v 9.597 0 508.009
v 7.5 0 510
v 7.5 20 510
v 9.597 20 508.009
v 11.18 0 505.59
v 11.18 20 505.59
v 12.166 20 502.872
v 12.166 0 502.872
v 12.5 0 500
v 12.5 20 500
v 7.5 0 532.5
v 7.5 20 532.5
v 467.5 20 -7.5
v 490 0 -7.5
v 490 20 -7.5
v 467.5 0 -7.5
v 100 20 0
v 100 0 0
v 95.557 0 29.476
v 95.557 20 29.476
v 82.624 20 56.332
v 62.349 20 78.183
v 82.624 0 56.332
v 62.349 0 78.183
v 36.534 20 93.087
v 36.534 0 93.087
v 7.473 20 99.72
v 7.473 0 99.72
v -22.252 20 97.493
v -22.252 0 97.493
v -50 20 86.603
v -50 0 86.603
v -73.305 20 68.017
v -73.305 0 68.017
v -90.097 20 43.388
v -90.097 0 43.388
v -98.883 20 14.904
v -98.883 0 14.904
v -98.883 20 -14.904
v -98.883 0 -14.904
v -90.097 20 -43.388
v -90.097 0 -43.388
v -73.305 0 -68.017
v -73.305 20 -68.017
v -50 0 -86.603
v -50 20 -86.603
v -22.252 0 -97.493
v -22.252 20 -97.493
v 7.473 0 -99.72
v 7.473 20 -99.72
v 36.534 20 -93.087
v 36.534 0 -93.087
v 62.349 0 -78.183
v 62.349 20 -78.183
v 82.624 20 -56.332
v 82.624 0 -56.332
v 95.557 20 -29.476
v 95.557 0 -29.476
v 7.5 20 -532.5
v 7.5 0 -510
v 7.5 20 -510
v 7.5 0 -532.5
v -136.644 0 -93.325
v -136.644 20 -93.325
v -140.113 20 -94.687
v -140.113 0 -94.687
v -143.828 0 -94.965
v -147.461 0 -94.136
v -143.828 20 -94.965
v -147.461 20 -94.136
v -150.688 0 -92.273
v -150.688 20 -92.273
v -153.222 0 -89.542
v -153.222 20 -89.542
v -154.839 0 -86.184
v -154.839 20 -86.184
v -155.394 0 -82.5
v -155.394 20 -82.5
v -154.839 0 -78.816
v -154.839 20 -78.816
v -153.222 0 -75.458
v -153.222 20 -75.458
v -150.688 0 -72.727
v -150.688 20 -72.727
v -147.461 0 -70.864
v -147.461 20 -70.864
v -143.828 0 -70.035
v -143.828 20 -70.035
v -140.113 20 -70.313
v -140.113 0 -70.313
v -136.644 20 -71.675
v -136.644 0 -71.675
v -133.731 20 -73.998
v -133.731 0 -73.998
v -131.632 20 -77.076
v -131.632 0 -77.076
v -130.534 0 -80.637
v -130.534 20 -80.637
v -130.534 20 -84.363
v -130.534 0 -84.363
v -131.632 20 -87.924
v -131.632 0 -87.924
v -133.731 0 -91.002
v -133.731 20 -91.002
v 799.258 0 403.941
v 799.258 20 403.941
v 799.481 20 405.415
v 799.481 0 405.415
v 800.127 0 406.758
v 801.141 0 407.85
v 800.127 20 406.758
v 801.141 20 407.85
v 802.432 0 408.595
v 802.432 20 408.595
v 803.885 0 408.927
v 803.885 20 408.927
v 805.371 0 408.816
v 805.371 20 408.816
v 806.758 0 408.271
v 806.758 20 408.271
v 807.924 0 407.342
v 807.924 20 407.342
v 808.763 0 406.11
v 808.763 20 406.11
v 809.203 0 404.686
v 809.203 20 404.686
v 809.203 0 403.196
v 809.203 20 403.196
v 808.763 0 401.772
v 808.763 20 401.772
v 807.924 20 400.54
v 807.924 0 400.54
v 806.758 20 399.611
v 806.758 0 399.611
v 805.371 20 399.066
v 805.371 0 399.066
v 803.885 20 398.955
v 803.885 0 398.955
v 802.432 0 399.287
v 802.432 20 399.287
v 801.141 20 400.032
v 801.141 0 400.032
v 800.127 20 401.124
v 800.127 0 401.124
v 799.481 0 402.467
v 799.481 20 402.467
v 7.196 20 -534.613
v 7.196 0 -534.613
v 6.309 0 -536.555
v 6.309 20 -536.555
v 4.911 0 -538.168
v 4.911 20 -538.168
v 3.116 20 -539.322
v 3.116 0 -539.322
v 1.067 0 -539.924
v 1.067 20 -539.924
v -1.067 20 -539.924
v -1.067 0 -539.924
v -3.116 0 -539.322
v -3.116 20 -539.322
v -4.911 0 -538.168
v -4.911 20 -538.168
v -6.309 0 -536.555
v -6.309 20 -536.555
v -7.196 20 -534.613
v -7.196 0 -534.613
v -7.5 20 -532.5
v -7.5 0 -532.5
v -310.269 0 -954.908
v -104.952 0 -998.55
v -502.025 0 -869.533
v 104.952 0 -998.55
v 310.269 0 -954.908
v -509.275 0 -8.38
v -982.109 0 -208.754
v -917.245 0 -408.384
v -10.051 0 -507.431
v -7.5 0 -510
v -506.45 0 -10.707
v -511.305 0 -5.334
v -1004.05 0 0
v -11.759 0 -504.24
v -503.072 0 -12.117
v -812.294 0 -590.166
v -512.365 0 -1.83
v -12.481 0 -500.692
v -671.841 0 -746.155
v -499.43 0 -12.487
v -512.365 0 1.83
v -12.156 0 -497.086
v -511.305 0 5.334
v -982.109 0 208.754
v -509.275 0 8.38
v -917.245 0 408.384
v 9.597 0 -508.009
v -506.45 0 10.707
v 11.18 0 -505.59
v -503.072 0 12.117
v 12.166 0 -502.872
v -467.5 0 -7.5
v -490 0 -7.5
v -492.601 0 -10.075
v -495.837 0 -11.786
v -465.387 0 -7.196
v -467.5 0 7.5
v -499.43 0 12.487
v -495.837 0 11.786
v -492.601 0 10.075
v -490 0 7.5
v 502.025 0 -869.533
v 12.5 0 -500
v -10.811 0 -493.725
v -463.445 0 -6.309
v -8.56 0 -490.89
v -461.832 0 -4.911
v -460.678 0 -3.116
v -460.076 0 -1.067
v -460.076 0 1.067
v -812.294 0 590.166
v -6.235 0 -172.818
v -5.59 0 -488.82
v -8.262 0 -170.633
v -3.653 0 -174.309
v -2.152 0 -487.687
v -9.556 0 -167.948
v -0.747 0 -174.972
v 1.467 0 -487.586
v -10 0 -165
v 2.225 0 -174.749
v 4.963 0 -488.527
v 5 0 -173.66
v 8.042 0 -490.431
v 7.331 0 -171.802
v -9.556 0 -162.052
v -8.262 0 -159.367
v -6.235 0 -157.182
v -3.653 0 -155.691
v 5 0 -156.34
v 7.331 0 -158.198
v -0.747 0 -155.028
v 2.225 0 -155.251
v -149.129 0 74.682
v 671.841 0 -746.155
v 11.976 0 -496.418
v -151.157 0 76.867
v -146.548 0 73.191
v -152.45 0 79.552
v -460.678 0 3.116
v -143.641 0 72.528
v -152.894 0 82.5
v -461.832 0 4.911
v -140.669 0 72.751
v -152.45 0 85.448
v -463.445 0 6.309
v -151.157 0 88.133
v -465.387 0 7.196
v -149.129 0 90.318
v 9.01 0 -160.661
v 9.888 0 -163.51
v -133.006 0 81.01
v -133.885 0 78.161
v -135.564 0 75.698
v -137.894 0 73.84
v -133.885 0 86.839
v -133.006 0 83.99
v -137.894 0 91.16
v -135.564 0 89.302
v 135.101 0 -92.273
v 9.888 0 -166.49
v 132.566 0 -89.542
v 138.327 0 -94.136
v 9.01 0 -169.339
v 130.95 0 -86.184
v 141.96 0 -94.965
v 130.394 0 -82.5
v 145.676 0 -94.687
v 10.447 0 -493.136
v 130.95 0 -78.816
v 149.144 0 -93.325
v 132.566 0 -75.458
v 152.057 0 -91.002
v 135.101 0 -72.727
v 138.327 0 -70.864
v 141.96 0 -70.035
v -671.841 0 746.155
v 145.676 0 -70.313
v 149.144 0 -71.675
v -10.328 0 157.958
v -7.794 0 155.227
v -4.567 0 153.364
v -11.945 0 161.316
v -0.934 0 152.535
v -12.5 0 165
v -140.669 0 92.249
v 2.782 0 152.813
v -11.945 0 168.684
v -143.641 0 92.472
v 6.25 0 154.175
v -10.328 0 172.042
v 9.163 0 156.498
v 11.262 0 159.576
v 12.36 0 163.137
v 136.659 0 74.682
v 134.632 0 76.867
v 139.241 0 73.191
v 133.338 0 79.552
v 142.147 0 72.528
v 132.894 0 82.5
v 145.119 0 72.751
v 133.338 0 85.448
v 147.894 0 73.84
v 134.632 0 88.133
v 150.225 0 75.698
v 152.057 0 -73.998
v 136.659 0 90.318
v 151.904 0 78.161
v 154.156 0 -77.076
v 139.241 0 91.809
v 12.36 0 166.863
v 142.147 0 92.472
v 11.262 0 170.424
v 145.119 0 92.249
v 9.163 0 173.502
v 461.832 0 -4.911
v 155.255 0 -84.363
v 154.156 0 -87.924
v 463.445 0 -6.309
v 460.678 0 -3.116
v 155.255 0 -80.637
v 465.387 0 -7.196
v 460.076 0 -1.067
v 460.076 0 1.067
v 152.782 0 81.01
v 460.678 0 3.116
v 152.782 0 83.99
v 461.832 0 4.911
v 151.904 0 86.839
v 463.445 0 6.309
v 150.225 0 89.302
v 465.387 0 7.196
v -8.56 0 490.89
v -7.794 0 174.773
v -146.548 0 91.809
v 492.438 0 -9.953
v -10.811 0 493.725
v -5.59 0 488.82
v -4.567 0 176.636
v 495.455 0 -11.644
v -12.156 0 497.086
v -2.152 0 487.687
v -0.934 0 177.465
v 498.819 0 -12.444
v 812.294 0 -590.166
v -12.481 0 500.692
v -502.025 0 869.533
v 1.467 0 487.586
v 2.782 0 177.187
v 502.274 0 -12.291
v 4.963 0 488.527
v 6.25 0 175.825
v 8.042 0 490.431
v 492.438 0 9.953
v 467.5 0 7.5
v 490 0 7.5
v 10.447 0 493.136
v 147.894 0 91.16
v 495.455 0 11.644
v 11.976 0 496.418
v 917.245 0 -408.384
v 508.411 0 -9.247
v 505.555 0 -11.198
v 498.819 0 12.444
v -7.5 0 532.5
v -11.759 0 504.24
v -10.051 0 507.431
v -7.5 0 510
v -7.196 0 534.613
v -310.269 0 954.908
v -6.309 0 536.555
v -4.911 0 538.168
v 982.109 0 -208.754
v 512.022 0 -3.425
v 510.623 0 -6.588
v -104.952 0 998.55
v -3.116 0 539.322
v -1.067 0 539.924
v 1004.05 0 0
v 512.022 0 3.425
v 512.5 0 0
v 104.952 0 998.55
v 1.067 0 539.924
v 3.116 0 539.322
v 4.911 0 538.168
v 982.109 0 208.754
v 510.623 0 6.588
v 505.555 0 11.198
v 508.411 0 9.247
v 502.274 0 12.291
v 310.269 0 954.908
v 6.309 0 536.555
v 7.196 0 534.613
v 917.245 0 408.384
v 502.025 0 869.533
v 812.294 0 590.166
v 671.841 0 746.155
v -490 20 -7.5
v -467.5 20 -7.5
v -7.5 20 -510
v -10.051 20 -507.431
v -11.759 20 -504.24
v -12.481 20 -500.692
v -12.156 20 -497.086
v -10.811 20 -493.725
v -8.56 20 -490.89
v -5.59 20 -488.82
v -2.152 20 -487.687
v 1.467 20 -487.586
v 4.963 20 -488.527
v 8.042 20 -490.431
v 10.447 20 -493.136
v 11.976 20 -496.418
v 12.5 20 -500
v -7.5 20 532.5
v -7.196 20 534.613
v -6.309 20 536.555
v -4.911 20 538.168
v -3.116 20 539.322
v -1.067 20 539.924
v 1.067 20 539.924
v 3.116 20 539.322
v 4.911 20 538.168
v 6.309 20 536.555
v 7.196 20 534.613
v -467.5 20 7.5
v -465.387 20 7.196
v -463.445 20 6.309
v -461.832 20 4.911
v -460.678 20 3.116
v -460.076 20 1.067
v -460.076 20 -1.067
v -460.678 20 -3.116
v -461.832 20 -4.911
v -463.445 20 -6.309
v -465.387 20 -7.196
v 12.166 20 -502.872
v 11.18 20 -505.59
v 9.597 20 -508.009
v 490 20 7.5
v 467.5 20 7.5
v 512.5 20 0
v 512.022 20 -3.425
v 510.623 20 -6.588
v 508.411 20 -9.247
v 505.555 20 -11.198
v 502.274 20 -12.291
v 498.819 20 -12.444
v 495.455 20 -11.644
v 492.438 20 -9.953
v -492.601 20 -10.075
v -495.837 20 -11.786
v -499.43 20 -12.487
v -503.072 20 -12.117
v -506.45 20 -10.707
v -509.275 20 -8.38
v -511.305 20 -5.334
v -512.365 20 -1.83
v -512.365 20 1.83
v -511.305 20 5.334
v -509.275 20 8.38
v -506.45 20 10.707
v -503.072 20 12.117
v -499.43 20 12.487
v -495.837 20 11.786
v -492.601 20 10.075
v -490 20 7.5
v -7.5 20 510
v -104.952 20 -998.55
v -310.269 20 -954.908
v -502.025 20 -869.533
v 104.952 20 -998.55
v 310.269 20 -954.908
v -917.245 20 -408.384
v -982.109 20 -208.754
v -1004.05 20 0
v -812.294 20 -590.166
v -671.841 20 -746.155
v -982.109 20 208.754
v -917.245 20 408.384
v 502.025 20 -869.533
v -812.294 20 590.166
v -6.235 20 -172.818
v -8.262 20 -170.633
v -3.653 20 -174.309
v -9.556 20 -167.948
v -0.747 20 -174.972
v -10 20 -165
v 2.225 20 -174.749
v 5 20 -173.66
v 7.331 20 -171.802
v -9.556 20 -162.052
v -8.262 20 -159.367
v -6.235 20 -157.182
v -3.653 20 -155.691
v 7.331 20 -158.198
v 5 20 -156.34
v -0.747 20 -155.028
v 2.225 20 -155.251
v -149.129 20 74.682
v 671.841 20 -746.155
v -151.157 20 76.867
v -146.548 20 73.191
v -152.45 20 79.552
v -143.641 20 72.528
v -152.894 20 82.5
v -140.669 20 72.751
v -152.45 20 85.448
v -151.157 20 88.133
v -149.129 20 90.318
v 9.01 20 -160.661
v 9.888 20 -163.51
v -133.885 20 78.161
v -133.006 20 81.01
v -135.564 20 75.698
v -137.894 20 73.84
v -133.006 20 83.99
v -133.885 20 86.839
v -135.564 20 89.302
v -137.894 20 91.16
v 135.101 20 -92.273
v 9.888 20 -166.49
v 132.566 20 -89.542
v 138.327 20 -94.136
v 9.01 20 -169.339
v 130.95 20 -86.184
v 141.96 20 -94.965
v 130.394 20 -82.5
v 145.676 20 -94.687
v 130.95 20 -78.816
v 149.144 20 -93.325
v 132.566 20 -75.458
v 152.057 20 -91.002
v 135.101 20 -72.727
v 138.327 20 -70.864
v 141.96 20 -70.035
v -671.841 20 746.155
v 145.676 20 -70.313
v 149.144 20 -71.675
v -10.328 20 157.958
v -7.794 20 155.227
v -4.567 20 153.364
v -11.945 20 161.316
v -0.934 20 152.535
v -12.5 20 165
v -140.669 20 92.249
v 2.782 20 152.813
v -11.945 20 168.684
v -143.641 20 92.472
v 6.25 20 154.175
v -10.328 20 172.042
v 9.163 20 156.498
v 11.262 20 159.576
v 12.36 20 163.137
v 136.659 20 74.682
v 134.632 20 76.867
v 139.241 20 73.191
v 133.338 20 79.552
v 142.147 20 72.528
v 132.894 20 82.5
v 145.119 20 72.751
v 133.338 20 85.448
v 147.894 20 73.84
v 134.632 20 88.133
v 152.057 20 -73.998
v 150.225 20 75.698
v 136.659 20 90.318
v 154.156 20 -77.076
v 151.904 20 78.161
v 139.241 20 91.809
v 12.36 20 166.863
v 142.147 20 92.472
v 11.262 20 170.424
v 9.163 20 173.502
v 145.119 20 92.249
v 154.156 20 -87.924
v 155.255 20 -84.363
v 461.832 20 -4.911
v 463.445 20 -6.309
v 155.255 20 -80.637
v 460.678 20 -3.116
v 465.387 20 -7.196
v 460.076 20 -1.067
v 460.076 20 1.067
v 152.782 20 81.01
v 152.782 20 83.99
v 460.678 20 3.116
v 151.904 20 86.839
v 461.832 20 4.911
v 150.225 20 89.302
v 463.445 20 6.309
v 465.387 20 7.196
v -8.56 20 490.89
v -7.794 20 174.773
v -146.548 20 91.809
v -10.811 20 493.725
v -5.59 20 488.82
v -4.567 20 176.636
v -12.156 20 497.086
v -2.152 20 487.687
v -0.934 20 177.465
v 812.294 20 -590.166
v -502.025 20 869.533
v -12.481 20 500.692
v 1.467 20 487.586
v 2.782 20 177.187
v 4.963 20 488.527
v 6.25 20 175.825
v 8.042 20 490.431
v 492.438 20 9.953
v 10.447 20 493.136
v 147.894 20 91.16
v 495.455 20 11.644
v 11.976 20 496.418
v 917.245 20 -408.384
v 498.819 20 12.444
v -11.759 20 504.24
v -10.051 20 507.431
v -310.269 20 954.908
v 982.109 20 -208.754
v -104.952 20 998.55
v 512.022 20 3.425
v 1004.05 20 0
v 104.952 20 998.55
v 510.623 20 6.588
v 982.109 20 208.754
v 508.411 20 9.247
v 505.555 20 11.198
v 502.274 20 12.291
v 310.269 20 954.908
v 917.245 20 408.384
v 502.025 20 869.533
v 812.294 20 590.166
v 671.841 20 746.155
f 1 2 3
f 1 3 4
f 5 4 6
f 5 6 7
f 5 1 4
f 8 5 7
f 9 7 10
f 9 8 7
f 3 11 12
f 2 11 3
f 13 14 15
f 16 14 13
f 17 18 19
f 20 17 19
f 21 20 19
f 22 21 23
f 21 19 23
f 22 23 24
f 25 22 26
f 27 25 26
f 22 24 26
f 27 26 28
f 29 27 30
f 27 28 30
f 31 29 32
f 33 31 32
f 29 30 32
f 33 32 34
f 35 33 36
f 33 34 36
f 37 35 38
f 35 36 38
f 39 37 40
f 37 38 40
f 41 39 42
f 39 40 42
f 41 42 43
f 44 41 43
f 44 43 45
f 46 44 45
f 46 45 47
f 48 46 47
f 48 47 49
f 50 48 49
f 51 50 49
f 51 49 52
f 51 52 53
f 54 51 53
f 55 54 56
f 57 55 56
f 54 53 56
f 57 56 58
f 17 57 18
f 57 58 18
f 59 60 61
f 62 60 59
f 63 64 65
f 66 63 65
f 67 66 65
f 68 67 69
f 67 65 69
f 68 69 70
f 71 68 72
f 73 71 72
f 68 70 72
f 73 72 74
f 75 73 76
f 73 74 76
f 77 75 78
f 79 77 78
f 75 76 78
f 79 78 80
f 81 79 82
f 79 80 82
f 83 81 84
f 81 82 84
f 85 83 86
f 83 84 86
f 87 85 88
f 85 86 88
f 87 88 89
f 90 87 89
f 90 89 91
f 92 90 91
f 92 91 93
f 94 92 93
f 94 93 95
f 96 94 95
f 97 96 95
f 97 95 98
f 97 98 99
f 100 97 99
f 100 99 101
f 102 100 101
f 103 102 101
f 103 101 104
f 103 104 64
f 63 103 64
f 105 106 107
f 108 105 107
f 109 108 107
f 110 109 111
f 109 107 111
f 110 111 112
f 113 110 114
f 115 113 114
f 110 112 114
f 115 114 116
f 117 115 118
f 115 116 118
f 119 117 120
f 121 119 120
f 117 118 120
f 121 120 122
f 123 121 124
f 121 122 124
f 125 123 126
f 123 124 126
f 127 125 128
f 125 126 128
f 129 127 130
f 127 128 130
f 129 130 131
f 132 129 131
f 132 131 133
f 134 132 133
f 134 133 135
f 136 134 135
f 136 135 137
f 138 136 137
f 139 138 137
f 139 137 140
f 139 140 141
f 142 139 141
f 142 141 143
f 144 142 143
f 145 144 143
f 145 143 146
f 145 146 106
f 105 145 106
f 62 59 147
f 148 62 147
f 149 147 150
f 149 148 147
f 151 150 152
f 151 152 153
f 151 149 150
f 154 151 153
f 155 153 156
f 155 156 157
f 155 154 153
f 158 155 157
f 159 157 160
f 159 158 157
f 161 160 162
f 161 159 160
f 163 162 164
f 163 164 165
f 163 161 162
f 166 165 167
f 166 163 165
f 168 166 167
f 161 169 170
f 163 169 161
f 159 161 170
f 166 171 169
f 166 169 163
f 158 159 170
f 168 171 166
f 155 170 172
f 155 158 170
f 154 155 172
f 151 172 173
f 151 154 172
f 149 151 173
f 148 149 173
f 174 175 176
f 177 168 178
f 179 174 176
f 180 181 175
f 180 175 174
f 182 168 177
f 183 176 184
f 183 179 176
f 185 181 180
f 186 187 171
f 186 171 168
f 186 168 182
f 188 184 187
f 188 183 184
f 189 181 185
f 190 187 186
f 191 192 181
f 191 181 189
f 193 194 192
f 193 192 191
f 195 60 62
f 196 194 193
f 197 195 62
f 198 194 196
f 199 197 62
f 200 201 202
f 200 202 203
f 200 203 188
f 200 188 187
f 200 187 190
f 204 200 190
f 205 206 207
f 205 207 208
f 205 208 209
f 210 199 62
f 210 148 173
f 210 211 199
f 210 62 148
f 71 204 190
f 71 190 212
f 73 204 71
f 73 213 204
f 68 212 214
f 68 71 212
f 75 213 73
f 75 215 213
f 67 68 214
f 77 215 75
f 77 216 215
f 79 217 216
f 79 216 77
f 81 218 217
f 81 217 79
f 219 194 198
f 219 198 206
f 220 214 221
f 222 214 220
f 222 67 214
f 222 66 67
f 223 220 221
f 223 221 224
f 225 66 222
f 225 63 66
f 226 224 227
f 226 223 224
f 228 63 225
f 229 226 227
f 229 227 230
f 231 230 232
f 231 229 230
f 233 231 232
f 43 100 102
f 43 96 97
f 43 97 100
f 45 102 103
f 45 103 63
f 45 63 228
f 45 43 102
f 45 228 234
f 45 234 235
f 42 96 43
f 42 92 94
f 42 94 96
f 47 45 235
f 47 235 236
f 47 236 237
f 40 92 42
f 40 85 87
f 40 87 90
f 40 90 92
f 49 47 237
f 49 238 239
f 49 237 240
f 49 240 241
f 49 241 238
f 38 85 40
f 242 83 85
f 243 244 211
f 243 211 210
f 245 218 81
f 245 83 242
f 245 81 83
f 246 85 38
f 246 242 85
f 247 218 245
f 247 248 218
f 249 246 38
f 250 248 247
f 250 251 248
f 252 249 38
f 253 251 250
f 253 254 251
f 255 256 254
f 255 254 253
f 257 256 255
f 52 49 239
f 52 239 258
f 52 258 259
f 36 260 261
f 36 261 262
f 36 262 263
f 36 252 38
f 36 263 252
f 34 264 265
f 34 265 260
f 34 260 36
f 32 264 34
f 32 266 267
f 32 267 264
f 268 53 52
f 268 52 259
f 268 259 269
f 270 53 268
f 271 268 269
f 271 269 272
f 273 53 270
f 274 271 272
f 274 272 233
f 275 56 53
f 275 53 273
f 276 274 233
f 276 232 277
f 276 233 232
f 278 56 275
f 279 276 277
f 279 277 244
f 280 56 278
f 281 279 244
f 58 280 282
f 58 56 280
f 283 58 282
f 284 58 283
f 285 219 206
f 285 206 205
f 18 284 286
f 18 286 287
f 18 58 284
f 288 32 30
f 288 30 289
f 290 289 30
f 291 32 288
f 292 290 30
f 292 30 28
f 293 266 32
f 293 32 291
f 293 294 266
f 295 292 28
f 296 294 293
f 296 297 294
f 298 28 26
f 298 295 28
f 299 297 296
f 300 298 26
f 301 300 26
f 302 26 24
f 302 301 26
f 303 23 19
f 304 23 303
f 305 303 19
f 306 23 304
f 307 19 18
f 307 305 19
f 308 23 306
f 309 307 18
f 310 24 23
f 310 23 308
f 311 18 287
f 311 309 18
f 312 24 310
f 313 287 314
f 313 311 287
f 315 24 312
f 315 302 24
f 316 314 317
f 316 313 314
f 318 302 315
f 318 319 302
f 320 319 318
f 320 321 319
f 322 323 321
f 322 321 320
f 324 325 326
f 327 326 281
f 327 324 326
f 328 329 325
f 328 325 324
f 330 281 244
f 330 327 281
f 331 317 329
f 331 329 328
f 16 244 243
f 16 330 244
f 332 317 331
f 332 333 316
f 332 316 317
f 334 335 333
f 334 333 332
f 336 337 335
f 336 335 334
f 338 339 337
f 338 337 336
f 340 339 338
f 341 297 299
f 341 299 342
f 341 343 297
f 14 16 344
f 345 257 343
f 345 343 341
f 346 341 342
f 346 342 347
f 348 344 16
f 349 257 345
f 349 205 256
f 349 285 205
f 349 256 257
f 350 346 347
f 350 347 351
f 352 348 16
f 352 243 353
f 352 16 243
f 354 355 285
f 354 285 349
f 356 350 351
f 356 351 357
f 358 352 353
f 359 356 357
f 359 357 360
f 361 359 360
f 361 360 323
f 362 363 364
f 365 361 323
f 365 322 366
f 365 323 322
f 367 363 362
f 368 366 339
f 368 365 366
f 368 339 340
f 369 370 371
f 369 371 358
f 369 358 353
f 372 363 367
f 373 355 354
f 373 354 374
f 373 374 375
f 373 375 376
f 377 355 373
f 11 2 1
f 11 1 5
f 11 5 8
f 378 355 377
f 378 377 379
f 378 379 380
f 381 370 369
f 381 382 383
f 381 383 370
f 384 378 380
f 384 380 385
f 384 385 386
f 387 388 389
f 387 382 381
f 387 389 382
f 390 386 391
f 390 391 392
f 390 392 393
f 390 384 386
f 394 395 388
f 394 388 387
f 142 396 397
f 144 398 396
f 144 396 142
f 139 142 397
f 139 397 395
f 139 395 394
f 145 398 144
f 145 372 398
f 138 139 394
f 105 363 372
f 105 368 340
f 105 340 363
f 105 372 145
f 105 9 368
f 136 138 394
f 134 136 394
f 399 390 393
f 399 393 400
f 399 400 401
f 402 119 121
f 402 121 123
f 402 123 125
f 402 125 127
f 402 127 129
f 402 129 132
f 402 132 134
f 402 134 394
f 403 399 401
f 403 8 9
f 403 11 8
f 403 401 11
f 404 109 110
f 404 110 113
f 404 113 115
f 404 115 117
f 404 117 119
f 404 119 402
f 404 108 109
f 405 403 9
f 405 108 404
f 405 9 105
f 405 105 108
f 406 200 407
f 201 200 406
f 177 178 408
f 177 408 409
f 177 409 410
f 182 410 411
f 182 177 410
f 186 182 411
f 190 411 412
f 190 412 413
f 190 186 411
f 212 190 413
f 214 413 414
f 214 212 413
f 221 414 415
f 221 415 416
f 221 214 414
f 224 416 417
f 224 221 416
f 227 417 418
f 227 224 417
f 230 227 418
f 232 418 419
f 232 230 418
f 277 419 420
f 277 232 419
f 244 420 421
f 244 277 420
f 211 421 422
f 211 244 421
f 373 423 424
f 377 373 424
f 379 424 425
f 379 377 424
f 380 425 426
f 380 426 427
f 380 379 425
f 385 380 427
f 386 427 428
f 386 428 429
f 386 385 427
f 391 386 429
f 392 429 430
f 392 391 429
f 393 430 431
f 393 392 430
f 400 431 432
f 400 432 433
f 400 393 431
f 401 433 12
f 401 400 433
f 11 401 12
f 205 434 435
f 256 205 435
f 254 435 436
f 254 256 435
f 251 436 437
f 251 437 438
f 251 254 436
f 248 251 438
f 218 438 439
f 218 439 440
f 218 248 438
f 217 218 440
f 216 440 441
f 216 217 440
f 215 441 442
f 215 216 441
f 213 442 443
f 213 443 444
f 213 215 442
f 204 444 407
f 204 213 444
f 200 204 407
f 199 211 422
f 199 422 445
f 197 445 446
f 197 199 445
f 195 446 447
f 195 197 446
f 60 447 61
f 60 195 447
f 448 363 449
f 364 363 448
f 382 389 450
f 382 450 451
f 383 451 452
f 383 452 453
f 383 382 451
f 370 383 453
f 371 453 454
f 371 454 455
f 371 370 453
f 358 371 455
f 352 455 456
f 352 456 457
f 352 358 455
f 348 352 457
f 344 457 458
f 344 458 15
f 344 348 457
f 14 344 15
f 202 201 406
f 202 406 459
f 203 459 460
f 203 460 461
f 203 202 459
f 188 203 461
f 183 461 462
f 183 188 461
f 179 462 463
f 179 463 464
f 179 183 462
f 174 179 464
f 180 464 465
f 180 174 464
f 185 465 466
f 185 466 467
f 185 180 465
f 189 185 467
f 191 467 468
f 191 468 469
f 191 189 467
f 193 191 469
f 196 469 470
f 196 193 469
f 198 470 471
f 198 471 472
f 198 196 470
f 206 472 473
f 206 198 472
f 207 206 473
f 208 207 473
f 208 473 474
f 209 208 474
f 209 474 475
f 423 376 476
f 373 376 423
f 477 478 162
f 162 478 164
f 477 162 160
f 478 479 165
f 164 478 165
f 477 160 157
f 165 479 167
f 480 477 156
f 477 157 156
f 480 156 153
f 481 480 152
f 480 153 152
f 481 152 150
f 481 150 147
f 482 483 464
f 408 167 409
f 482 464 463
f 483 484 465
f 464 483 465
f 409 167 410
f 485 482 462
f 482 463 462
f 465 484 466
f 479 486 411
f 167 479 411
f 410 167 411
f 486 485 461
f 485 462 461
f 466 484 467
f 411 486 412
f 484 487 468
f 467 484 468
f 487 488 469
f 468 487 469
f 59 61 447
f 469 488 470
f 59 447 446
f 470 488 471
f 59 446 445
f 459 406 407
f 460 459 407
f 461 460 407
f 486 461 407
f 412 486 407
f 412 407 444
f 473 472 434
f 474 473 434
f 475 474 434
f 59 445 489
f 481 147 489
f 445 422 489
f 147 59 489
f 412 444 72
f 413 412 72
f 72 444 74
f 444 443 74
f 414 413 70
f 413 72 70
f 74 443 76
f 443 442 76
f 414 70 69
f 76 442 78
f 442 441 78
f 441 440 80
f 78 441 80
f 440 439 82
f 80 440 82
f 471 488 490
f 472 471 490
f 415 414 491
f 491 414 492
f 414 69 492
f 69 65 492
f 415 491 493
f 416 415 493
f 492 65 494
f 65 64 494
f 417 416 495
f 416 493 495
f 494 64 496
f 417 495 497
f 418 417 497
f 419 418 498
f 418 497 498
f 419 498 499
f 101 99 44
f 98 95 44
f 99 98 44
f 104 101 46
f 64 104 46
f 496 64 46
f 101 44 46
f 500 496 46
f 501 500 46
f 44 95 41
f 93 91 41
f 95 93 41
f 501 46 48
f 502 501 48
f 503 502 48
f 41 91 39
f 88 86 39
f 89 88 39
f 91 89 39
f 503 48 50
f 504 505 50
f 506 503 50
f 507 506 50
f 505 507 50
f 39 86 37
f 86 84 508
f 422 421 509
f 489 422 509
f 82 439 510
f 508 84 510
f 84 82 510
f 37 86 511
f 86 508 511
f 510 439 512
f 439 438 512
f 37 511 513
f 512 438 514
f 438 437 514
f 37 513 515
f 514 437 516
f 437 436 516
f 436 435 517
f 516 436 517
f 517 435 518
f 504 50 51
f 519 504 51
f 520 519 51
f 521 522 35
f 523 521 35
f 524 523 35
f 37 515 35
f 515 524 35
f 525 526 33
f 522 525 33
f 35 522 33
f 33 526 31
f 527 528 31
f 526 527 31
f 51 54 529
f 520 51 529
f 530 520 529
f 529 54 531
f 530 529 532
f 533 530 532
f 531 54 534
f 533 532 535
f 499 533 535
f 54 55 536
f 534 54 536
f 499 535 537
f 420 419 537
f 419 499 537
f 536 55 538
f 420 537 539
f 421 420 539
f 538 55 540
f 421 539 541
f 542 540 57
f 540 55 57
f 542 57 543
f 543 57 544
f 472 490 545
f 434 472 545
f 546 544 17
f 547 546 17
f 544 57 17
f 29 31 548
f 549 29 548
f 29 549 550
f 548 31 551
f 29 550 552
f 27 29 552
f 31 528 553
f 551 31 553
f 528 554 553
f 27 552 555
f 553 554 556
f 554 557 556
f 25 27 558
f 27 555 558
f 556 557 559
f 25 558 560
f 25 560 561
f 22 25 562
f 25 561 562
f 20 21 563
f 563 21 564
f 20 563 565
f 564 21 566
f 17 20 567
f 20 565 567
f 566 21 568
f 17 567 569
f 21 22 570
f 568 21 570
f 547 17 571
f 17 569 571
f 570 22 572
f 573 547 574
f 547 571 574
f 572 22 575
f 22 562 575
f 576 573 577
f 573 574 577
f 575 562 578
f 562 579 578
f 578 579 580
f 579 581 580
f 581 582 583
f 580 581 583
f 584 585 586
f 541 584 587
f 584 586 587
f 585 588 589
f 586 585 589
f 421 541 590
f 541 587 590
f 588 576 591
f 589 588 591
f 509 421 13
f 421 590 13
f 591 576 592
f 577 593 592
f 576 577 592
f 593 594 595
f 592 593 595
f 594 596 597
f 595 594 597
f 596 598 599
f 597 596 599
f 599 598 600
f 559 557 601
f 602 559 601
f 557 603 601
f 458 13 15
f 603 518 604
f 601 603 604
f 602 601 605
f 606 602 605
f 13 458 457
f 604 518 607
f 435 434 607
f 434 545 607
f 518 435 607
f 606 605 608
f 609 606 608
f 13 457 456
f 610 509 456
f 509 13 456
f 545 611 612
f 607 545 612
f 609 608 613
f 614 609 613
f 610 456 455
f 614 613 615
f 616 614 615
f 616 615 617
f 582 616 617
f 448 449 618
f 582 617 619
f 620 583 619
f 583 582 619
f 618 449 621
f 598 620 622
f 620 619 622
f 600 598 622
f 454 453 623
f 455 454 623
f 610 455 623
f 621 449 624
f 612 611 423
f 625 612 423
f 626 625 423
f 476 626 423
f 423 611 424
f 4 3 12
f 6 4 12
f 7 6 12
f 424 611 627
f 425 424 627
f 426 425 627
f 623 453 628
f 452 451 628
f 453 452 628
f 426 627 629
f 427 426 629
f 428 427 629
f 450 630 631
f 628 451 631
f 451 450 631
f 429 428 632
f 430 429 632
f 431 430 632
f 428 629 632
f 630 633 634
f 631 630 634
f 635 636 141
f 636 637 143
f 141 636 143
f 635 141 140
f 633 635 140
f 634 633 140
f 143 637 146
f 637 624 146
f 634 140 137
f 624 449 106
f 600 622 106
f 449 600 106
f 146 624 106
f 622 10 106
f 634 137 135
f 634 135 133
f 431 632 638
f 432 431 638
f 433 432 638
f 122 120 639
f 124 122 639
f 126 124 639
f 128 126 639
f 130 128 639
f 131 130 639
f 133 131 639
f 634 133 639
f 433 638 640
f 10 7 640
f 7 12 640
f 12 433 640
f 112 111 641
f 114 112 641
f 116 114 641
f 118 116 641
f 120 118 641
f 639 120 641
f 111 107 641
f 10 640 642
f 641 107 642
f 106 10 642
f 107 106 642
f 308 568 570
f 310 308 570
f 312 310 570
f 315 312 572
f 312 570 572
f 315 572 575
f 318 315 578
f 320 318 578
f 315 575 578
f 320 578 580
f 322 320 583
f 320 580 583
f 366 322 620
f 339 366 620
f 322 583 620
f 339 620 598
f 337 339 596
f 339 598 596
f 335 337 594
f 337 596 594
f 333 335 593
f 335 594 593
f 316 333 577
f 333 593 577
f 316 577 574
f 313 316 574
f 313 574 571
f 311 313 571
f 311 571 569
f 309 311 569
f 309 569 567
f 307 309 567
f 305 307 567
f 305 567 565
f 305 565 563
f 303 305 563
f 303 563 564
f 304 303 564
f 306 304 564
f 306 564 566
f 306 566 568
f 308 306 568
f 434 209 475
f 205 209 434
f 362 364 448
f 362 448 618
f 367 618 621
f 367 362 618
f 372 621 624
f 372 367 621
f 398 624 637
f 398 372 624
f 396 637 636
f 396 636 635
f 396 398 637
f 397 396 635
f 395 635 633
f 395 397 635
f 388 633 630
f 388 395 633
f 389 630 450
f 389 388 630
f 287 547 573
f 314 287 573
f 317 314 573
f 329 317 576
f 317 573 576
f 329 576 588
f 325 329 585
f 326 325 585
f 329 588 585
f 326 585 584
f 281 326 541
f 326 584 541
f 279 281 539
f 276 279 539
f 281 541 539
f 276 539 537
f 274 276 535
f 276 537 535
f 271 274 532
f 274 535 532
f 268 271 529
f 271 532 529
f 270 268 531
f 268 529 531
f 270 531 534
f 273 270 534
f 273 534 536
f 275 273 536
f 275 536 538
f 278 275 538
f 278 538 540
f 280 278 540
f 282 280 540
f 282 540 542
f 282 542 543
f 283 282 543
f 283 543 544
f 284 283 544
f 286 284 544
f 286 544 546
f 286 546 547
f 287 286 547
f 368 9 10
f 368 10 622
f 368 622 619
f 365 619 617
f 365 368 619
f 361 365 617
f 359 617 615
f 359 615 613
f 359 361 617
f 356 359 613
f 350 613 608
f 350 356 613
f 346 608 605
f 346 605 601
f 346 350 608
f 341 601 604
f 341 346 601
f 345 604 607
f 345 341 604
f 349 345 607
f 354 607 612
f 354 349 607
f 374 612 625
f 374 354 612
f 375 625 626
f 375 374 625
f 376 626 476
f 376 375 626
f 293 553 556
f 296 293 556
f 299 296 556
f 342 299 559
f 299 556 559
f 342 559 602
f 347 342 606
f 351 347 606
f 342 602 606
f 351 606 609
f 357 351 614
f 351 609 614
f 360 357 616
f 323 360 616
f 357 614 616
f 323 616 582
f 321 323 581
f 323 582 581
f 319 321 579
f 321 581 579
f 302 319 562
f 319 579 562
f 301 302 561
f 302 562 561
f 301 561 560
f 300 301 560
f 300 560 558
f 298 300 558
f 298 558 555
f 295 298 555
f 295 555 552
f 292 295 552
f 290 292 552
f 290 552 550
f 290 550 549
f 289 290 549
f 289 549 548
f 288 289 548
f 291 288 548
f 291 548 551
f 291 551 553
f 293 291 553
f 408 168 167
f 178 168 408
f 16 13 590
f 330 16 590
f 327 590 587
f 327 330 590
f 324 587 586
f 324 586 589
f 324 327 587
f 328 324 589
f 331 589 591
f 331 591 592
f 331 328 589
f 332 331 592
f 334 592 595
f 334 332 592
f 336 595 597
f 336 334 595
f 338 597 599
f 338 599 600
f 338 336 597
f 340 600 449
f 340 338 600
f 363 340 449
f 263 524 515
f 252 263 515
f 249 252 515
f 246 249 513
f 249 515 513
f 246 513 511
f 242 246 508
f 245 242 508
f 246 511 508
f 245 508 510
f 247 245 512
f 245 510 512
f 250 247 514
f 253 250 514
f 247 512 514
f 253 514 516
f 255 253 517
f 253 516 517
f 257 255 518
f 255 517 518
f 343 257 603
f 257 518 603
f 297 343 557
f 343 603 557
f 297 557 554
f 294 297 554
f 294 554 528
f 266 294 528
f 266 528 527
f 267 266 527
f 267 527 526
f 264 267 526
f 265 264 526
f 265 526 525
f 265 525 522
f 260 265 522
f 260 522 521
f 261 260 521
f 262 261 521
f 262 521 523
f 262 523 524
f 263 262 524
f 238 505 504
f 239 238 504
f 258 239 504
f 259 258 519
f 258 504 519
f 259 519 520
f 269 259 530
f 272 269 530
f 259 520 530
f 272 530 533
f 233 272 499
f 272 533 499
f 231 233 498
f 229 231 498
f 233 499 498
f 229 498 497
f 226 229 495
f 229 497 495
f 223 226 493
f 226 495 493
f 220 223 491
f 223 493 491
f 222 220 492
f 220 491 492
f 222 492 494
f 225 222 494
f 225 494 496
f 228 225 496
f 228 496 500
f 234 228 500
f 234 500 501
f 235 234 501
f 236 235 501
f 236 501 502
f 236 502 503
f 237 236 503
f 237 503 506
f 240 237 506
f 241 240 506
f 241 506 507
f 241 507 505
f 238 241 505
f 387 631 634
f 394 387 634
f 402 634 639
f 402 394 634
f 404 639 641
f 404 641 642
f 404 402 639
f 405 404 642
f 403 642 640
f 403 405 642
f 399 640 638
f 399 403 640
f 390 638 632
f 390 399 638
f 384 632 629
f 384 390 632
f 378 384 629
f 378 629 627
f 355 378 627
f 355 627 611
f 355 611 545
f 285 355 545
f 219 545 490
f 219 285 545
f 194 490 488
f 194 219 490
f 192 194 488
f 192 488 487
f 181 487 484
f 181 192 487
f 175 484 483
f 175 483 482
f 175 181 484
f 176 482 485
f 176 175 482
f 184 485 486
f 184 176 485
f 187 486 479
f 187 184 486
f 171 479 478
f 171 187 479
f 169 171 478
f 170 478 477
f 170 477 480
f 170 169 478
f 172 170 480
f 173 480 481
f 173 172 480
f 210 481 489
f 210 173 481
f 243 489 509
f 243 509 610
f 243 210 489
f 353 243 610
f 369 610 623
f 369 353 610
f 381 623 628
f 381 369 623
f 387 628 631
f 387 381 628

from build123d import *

# Parameters (mm, degrees)
F0_R            = 1004.05
F0_R_2          = 100
F1_DEPTH        = 20
F2_D            = 25
F2_DEPTH        = 28
F2_TIP          = 7.5107577378
F2_COPIES_COUNT = 3
F3_D            = 20
F3_DEPTH        = 28
F3_TIP          = 6.0086061903
F3_COPIES_COUNT = 3
F4_D            = 10
F4_DEPTH        = 28
F4_TIP          = 3.0043030951


# Not quite as in the source:
# - a pattern or mirror of a feature is missing from the dataset's text; its kind, count and spacing are read off the source's solid


with BuildPart() as f1:
    # F0 (on Front) → F1 (new body)
    with BuildSketch(Plane.XZ):
        Circle(F0_R)
        with BuildLine():
            ThreePointArc((12.5, -500), (11.1803398875, -505.5901699437), (7.5, -510))
            Line((7.5, -510), (7.5, -532.5))
            ThreePointArc((7.5, -532.5), (5.3033008589, -537.8033008589), (0, -540))
            ThreePointArc((0, -540), (-5.3033008589, -537.8033008589), (-7.5, -532.5))
            Line((-7.5, -532.5), (-7.5, -510))
            ThreePointArc((-7.5, -510), (-5.5901699437, -488.8196601125), (12.5, -500))
        make_face(mode=Mode.SUBTRACT)
        with BuildLine():
            ThreePointArc((-490, -7.5), (-512.5, 0), (-490, 7.5))
            Line((-490, 7.5), (-467.5, 7.5))
            ThreePointArc((-467.5, 7.5), (-462.1966991411, 5.3033008589), (-460, 0))
            ThreePointArc((-460, 0), (-462.1966991411, -5.3033008589), (-467.5, -7.5))
            Line((-467.5, -7.5), (-490, -7.5))
        make_face(mode=Mode.SUBTRACT)
        Circle(F0_R_2, mode=Mode.SUBTRACT)
        with BuildLine():
            ThreePointArc((512.5, 0), (503.9528470752, -11.8585412256), (490, -7.5))
            Line((490, -7.5), (467.5, -7.5))
            ThreePointArc((467.5, -7.5), (462.1966991411, -5.3033008589), (460, 0))
            ThreePointArc((460, 0), (462.1966991411, 5.3033008589), (467.5, 7.5))
            Line((467.5, 7.5), (490, 7.5))
            ThreePointArc((490, 7.5), (503.9528470752, 11.8585412256), (512.5, 0))
        make_face(mode=Mode.SUBTRACT)
        with BuildLine():
            ThreePointArc((7.5, 510), (11.1803398875, 505.5901699437), (12.5, 500))
            ThreePointArc((12.5, 500), (-5.5901699437, 488.8196601125), (-7.5, 510))
            Line((-7.5, 510), (-7.5, 532.5))
            ThreePointArc((-7.5, 532.5), (-5.3033008589, 537.8033008589), (0, 540))
            ThreePointArc((0, 540), (5.3033008589, 537.8033008589), (7.5, 532.5))
            Line((7.5, 532.5), (7.5, 510))
        make_face(mode=Mode.SUBTRACT)
    extrude(amount=-F1_DEPTH)

    # F2
    with Locations(Plane.XZ):
        with Locations((0, 165)):
            f2 = Hole(F2_D / 2, depth=F2_DEPTH)
            with Locations((0, 0, -(F2_DEPTH + F2_TIP / 2))):  # 118° drill point
                Cone(0, F2_D / 2, F2_TIP, mode=Mode.SUBTRACT)

    # F2_copies: F2 ×3 about axis
    f2_copies_axis = Axis((0, 0, 0), (0, 1, 0))
    for i in range(1, F2_COPIES_COUNT):
        add(f2.rotate(f2_copies_axis, i * 360 / F2_COPIES_COUNT), mode=Mode.SUBTRACT)

    # F3
    with Locations(Plane.XZ):
        with Locations((142.8941916244, 82.5)):
            f3 = Hole(F3_D / 2, depth=F3_DEPTH)
            with Locations((0, 0, -(F3_DEPTH + F3_TIP / 2))):  # 118° drill point
                Cone(0, F3_D / 2, F3_TIP, mode=Mode.SUBTRACT)

    # F3_copies: F3 ×3 about axis
    f3_copies_axis = Axis((0, 0, 0), (0, 1, 0))
    for i in range(1, F3_COPIES_COUNT):
        add(f3.rotate(f3_copies_axis, i * 360 / F3_COPIES_COUNT), mode=Mode.SUBTRACT)

    # F4
    with Locations(Plane.XZ):
        with Locations((804.2584775463, 403.9409626355)):
            Hole(F4_D / 2, depth=F4_DEPTH)
            with Locations((0, 0, -(F4_DEPTH + F4_TIP / 2))):  # 118° drill point
                Cone(0, F4_D / 2, F4_TIP, mode=Mode.SUBTRACT)


solid = f1.part
